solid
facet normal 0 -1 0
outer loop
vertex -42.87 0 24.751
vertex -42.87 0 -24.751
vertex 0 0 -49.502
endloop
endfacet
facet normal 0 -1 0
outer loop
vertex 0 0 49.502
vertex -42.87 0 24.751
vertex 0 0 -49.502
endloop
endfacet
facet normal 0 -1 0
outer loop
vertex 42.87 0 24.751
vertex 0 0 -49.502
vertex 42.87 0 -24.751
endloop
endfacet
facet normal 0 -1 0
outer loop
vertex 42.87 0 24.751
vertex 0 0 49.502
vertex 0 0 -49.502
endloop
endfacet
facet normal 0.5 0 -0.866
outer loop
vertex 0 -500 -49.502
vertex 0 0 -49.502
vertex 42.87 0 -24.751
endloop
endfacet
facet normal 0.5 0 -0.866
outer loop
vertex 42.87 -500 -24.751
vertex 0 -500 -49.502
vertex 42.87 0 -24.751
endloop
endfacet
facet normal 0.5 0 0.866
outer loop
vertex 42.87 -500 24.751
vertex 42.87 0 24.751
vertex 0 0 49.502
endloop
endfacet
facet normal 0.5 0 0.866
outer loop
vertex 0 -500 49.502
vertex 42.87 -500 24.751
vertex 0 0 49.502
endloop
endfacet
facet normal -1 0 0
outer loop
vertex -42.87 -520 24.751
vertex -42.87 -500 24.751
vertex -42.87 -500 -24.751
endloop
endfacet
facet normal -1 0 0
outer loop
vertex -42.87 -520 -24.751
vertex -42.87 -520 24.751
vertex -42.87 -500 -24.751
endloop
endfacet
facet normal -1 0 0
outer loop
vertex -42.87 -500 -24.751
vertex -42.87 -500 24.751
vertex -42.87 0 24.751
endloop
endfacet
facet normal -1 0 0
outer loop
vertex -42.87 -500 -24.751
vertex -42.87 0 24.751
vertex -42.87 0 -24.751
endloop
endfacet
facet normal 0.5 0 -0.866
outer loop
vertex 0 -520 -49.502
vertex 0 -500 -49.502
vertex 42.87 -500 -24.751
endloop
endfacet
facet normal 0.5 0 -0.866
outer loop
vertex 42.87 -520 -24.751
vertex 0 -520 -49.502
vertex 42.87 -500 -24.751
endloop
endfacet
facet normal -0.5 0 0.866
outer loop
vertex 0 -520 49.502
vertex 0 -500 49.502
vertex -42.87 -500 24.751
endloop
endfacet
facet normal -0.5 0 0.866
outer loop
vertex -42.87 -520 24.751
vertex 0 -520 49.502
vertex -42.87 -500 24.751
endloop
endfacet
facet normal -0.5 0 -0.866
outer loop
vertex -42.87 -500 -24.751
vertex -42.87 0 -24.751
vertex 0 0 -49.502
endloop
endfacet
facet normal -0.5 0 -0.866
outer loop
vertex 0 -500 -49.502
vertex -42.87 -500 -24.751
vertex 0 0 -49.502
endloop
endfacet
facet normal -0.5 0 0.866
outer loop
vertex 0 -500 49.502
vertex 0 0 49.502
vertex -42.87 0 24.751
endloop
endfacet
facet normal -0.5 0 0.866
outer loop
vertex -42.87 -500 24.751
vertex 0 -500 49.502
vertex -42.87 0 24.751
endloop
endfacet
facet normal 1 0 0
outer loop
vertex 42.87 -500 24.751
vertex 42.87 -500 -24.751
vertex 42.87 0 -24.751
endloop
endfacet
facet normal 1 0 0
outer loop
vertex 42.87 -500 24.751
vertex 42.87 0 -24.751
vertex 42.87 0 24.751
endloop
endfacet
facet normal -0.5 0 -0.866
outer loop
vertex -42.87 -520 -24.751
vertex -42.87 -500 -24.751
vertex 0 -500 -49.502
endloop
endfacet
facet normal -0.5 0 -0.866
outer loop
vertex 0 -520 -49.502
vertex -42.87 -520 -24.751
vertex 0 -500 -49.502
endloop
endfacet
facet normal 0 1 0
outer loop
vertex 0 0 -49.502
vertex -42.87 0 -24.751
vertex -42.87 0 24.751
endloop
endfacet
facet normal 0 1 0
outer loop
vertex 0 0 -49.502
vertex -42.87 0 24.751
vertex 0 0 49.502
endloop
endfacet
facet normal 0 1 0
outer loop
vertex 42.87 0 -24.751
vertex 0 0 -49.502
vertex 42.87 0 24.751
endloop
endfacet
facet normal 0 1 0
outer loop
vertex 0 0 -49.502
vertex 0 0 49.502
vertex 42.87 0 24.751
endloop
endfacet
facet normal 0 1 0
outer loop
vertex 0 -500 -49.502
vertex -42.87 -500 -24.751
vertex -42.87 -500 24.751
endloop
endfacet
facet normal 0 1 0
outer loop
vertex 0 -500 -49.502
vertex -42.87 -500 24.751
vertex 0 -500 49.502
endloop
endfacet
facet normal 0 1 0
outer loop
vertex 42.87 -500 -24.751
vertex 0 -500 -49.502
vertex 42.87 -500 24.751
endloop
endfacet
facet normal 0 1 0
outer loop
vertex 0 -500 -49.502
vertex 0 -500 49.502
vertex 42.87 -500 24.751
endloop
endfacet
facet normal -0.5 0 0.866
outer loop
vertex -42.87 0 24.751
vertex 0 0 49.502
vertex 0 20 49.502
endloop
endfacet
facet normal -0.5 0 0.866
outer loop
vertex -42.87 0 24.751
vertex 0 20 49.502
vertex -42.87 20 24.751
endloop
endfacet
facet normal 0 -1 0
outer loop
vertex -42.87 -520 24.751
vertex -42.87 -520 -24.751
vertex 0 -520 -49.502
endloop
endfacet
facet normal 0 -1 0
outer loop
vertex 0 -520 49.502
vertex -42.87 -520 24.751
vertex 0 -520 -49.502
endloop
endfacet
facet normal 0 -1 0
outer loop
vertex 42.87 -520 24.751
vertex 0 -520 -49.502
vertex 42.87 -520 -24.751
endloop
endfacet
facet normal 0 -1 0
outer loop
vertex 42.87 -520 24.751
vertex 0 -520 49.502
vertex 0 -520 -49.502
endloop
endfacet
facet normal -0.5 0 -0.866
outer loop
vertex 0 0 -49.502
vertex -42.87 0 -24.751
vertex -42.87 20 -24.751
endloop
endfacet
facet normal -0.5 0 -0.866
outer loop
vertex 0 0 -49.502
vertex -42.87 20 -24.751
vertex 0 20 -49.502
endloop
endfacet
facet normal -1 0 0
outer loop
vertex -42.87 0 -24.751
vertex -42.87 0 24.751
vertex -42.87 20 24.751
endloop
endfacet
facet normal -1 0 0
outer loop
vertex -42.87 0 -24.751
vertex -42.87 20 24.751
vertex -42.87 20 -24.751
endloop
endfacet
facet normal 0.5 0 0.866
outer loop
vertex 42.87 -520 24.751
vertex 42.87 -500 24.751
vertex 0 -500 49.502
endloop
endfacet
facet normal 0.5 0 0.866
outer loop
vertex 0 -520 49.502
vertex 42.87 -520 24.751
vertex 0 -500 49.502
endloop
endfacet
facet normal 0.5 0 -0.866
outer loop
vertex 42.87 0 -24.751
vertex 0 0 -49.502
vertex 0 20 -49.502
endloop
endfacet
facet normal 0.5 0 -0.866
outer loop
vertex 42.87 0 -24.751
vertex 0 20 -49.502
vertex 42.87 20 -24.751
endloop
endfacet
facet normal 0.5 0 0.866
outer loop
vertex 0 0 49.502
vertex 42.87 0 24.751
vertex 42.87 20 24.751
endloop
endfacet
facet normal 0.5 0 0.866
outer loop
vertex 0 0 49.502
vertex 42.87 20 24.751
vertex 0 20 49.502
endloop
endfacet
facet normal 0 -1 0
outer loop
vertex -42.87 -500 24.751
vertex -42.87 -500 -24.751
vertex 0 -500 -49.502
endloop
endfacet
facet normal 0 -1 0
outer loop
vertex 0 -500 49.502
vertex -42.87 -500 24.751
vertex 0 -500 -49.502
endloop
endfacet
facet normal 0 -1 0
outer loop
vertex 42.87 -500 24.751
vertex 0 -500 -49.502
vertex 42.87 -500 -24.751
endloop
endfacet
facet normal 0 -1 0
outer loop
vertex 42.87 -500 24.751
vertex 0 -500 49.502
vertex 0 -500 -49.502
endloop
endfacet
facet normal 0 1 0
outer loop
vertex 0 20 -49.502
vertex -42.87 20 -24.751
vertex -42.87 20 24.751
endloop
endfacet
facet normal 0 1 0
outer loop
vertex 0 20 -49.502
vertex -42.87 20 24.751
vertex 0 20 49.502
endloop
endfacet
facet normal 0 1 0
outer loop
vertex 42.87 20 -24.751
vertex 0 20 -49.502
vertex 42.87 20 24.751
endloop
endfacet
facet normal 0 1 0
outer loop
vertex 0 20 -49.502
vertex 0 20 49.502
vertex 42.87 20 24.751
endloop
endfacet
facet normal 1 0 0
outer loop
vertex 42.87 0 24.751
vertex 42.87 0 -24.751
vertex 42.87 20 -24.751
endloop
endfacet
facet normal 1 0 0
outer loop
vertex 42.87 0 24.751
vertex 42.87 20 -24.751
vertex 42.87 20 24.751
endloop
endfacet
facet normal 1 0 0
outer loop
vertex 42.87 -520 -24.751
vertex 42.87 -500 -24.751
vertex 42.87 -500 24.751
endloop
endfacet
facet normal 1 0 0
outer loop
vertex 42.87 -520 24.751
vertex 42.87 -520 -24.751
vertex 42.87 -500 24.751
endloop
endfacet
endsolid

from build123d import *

# Parameters (mm, degrees)
F1_DEPTH = 500
F6_DEPTH = 20
F7_DEPTH = 20


with BuildPart() as f1:
    # F0 (on Front) → F1 (new body)
    with BuildSketch(Plane.XZ):
        Polygon((-42.8698770702, 24.7509350666), (-42.8698770702, -24.7509350666), (0, -49.5018701332), (42.8698770702, -24.7509350666), (42.8698770702, 24.7509350666), (0, 49.5018701332), align=None)
    extrude(amount=F1_DEPTH)


with BuildPart() as f6:
    # F6 (new): a face of the model
    f6_faces = [f1.part.faces().sort_by_distance(p)[0] for p in [
        (0, -500, 0),
    ]]
    extrude(f6_faces, amount=F6_DEPTH)


with BuildPart() as f7:
    # F7 (new): a face of the model
    f7_faces = [f1.part.faces().sort_by_distance(p)[0] for p in [
        (0, 0, 0),
    ]]
    extrude(f7_faces, amount=F7_DEPTH)


solid = Compound([f1.part, f6.part, f7.part])
